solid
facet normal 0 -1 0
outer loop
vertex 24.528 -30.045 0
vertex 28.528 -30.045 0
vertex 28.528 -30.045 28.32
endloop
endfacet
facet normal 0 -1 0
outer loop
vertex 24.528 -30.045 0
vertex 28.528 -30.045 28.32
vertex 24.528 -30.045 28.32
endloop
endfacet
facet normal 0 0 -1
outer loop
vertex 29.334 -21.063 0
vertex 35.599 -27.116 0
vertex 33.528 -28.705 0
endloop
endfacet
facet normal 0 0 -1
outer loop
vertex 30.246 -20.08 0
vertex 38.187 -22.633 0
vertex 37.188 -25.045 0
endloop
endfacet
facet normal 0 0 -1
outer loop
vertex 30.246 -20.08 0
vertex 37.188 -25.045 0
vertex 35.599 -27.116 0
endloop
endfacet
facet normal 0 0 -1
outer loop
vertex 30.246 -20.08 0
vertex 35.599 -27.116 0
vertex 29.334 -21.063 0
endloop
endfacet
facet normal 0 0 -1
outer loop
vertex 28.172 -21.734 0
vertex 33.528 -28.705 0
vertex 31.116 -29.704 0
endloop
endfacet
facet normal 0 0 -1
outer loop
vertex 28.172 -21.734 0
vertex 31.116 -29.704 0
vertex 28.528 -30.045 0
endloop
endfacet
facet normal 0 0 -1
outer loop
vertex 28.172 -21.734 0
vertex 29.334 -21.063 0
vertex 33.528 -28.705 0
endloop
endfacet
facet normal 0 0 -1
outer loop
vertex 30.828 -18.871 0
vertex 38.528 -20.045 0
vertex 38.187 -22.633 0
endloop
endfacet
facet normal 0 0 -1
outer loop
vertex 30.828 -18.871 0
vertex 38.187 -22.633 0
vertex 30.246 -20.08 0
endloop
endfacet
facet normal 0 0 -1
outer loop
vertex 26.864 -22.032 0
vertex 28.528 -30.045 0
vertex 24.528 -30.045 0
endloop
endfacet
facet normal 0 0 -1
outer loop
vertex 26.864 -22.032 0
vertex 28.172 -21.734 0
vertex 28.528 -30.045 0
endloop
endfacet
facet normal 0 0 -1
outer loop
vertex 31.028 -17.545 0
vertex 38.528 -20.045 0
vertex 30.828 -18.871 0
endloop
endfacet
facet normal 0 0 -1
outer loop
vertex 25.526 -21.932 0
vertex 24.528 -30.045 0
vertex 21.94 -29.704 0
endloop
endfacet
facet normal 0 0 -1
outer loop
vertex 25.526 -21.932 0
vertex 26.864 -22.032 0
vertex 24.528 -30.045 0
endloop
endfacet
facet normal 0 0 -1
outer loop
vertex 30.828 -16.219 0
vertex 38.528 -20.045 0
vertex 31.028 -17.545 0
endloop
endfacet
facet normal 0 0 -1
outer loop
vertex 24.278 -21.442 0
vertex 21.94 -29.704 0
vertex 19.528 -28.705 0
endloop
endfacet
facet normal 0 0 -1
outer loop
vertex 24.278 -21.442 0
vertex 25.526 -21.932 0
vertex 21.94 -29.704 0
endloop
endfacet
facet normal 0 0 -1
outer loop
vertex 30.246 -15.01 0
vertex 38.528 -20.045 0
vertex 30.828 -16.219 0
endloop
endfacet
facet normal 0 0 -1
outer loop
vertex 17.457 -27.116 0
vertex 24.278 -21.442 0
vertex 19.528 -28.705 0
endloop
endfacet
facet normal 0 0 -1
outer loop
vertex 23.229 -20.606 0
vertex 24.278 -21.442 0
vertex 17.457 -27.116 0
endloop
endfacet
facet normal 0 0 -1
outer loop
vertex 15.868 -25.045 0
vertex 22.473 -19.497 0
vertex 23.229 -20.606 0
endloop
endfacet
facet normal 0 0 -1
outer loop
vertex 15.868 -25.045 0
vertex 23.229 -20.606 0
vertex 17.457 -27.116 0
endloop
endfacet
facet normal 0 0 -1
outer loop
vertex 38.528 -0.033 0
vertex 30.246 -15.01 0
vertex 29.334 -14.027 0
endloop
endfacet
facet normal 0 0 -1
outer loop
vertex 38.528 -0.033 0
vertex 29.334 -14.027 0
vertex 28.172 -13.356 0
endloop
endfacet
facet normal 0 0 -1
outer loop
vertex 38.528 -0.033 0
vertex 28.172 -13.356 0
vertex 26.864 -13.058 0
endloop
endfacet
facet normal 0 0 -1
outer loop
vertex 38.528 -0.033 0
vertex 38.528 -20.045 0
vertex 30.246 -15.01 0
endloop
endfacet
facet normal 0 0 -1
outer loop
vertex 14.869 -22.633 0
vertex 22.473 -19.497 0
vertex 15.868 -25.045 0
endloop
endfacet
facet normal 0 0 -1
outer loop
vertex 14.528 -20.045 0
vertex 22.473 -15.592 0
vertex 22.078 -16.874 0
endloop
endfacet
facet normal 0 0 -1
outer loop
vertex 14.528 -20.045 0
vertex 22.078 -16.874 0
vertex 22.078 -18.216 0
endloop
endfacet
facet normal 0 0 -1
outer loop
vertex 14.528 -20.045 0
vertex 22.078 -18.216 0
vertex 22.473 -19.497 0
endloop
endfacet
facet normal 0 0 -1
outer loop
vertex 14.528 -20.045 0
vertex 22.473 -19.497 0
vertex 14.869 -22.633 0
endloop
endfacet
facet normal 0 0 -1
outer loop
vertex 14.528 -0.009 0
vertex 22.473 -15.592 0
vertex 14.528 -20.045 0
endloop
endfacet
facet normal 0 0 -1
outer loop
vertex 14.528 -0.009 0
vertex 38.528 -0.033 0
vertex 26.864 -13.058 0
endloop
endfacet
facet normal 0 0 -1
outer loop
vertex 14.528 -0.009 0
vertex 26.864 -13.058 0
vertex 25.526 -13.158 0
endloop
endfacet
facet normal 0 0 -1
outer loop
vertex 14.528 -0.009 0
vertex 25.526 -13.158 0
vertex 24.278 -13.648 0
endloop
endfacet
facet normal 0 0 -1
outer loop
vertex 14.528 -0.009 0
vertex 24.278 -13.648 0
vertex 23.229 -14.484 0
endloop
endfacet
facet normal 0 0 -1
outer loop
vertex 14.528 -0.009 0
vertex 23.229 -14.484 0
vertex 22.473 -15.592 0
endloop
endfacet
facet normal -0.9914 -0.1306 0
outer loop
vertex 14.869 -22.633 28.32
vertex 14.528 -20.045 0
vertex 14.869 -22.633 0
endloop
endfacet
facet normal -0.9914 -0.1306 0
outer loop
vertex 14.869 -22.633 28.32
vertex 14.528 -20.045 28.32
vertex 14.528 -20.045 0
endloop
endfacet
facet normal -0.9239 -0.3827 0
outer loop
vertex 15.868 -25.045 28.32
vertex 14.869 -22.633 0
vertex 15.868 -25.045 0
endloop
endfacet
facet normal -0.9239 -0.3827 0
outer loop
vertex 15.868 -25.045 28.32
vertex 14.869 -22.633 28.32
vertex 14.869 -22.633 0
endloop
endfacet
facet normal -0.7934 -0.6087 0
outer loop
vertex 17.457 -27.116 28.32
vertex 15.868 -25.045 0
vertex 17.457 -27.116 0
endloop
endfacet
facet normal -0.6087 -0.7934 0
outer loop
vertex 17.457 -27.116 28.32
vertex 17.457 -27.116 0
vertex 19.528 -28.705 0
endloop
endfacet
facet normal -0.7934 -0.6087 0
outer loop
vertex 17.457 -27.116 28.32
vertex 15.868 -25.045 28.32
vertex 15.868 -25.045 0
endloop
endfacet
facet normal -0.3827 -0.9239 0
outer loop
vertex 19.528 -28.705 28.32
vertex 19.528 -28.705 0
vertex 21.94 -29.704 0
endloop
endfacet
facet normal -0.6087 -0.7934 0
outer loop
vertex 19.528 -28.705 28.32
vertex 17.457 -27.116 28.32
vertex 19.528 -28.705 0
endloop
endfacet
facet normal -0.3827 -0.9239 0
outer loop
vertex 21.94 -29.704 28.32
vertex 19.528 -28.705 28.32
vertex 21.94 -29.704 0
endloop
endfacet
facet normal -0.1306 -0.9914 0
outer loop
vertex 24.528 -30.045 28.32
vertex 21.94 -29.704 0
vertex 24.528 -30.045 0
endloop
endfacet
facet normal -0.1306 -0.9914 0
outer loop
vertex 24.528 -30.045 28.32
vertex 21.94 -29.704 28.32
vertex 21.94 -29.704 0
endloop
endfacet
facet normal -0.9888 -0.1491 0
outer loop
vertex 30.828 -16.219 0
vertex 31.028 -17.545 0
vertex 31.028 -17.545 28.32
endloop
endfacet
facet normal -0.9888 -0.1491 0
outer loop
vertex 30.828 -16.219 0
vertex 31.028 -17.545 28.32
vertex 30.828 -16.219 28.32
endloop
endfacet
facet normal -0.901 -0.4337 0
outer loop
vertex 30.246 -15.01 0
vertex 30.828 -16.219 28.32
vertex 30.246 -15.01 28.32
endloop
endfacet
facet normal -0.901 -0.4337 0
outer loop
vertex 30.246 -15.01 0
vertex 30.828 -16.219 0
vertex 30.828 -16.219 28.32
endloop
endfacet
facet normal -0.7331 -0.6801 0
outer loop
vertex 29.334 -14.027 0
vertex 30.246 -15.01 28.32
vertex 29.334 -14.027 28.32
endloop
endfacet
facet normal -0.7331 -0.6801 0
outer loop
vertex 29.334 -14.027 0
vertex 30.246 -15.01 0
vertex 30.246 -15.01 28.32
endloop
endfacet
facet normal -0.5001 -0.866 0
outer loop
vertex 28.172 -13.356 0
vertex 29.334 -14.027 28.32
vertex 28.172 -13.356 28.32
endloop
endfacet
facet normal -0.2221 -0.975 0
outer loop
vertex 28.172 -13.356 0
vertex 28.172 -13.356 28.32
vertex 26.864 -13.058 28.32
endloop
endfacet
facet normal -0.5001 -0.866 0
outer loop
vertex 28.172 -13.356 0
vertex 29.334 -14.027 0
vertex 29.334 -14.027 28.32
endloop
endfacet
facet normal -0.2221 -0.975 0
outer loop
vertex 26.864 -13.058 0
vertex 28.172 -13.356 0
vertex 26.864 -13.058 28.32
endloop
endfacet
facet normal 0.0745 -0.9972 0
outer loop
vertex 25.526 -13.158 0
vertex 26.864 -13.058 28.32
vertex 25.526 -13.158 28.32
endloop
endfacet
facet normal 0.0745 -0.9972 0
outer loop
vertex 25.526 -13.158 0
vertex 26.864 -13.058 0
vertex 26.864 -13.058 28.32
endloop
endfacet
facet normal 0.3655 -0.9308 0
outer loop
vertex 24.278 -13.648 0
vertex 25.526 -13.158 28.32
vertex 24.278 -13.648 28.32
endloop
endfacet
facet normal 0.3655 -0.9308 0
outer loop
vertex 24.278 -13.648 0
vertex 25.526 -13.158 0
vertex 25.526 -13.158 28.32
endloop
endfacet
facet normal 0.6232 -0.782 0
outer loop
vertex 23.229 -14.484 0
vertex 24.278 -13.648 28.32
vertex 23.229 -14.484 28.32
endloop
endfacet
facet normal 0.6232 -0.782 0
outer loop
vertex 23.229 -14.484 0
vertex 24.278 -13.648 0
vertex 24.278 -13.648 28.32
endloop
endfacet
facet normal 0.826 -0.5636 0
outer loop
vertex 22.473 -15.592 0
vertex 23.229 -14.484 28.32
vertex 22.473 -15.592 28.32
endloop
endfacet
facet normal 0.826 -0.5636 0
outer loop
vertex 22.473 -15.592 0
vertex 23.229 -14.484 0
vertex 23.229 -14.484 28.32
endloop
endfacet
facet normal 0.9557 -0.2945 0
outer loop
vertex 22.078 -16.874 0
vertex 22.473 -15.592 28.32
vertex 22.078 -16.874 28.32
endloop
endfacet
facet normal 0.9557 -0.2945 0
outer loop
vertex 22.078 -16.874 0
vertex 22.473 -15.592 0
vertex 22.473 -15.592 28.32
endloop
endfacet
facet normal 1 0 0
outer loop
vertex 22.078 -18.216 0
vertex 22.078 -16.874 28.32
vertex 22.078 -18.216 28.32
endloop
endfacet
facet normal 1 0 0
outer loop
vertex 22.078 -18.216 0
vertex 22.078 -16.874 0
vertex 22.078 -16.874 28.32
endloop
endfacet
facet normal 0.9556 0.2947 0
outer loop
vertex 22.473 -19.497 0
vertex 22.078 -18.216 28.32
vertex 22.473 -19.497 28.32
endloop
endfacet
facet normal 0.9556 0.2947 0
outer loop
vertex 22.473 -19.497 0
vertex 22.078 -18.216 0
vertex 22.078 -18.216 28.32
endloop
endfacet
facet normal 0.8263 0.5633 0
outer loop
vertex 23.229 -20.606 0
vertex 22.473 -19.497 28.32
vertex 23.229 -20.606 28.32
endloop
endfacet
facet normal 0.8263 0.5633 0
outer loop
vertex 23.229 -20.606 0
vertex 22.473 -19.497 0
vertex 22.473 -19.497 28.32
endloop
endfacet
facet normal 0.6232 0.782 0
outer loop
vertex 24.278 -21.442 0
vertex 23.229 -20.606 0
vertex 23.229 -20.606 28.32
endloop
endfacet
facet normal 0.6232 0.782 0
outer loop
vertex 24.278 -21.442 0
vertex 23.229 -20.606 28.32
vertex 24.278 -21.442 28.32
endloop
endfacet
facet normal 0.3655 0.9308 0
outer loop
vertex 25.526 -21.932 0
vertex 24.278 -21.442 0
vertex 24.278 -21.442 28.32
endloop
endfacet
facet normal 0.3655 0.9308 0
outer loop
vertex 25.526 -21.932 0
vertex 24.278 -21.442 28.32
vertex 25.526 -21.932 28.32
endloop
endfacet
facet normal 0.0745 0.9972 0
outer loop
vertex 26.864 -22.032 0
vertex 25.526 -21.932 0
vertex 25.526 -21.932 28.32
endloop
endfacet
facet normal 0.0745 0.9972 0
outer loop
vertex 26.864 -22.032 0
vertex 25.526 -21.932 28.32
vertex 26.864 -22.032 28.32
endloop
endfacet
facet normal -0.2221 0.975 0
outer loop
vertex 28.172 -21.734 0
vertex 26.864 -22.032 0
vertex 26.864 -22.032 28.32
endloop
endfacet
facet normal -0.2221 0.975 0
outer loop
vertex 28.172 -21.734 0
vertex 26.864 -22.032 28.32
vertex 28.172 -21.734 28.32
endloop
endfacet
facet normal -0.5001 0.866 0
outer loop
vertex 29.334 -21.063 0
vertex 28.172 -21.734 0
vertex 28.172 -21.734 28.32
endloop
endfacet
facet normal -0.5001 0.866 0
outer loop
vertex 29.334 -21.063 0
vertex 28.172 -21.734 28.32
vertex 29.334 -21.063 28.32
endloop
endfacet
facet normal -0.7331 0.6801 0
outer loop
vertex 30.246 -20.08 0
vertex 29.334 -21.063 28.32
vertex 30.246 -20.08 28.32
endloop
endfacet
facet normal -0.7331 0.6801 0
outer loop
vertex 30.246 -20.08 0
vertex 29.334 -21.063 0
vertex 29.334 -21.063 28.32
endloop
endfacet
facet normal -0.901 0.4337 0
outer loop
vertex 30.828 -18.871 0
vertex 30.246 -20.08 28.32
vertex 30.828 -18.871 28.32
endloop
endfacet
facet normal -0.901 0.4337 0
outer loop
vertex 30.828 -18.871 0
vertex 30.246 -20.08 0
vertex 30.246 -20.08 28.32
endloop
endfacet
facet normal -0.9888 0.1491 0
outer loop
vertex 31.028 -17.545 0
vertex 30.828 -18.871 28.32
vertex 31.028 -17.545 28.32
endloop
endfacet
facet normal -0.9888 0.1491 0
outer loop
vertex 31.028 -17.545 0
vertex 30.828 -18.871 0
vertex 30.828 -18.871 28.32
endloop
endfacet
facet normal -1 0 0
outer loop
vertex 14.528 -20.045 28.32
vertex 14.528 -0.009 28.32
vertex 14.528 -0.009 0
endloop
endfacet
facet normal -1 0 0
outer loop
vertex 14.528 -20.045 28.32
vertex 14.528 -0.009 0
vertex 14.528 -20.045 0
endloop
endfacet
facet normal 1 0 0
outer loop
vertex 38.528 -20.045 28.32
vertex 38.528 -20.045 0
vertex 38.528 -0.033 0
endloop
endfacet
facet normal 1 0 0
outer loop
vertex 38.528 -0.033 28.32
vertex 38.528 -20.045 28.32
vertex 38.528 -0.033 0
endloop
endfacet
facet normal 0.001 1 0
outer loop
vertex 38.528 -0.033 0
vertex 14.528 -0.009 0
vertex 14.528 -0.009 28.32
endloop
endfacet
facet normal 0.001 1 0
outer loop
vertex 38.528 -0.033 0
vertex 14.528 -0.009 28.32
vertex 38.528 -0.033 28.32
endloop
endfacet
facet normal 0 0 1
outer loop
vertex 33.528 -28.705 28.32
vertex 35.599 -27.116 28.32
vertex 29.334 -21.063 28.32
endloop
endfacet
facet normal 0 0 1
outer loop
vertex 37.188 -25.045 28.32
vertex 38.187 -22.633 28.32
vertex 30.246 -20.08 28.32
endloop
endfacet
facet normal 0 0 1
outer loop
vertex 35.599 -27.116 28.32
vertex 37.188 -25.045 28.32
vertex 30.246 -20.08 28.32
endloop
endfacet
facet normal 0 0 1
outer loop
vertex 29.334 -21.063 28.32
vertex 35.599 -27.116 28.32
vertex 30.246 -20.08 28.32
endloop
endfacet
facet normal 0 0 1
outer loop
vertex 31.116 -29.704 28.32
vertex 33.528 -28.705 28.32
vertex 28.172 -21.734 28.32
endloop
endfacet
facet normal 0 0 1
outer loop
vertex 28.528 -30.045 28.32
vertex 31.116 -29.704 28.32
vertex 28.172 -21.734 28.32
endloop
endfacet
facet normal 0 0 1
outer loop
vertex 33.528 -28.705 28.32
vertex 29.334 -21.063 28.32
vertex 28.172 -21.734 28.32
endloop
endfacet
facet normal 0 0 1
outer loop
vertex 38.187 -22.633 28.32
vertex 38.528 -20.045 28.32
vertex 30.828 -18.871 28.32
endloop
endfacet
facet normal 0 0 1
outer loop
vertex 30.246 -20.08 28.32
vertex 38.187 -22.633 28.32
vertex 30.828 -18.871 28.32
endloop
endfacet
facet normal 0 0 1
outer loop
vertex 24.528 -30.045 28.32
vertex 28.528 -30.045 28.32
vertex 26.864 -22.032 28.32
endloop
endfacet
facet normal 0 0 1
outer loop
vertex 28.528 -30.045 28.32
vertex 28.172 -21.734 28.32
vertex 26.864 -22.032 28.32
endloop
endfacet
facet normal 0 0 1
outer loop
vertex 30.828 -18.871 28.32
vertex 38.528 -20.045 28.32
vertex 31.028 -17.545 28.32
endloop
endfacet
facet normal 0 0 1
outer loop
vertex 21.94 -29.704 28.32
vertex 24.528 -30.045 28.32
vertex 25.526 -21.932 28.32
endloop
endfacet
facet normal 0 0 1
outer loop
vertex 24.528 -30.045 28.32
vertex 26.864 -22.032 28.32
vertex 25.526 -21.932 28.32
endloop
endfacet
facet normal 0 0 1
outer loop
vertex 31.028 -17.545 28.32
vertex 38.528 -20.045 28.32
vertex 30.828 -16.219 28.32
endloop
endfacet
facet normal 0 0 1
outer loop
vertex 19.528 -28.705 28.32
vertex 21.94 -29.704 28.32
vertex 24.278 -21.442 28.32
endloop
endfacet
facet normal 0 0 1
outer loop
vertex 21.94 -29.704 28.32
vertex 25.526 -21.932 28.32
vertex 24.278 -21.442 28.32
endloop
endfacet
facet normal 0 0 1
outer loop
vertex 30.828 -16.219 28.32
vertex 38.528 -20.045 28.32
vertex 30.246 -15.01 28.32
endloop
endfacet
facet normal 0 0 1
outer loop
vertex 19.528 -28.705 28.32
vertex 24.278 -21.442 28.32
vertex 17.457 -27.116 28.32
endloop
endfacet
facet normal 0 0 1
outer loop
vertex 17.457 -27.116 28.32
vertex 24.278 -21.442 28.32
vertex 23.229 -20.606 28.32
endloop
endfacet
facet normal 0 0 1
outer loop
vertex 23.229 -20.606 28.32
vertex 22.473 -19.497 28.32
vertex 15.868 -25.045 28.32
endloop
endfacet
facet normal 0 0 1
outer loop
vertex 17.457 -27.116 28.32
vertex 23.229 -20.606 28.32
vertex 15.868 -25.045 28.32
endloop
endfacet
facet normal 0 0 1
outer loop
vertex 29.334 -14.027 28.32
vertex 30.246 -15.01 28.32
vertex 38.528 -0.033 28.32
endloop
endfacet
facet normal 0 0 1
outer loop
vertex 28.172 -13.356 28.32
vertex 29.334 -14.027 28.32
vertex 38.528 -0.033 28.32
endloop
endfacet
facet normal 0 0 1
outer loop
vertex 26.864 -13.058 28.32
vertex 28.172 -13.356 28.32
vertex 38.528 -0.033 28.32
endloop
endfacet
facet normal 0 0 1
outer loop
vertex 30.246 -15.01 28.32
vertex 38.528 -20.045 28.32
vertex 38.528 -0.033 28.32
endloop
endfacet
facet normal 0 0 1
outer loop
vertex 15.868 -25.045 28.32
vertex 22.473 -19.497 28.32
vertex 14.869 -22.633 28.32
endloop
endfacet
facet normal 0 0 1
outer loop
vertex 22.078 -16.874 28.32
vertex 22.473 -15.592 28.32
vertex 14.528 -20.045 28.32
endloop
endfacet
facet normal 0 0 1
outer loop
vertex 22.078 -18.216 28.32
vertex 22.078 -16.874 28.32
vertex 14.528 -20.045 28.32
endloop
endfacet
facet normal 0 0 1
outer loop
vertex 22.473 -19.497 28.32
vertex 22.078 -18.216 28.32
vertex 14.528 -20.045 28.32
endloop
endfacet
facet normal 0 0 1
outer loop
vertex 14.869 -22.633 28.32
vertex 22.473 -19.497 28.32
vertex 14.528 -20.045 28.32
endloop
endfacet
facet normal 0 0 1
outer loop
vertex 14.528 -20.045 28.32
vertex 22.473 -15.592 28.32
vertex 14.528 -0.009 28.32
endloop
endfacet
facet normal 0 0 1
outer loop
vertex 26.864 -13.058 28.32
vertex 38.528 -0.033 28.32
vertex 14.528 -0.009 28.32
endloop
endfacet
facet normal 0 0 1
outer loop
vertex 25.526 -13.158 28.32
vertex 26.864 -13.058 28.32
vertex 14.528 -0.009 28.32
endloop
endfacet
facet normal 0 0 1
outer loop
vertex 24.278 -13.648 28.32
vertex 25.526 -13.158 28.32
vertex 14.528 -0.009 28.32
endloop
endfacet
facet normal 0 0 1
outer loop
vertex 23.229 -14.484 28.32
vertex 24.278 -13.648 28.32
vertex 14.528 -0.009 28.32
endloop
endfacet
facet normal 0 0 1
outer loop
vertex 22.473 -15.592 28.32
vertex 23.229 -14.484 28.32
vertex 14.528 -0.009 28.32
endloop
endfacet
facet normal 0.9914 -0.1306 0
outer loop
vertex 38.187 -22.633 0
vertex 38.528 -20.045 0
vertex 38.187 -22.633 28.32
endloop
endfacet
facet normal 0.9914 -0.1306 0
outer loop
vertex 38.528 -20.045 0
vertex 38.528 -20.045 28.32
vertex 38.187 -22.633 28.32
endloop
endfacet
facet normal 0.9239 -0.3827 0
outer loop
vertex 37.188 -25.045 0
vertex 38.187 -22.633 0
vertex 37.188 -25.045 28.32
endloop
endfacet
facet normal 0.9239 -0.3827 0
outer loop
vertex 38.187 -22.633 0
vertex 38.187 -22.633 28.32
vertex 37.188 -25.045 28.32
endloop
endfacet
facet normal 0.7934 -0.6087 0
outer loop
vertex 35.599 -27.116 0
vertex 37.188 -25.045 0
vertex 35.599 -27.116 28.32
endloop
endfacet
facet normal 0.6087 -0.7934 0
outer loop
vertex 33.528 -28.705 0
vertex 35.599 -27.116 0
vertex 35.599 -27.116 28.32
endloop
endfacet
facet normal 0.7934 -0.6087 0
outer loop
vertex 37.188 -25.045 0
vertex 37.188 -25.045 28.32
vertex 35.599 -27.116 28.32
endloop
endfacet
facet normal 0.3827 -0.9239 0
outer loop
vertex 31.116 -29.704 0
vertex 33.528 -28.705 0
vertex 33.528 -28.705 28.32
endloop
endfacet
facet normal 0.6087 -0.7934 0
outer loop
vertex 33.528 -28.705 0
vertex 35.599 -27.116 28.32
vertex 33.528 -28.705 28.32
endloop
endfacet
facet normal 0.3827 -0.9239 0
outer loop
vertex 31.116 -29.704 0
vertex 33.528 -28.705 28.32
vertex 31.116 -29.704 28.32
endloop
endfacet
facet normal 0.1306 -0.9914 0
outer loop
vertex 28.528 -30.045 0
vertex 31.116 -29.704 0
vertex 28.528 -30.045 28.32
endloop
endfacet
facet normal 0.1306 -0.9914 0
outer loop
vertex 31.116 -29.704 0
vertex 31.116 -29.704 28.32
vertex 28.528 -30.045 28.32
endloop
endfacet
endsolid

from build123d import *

# Parameters (mm, degrees)
CROQUIS1_R              = 4.5
SALIENTE_EXTRUIR1_DEPTH = 28.32
REDONDEO1_R             = 10


with BuildPart() as part:
    # Croquis1 → Saliente-Extruir1 (new body)
    with BuildSketch(Plane.XY):
        Polygon((14.527798388, -0.008569378), (38.527798388, -0.032811814), (38.527798388, -5.044933007), (38.527798388, -30.044933007), (14.527798388, -30.044933007), (14.527798388, -5.044933007), align=None)
        with Locations((26.527798388, -17.544933007)):
            Circle(CROQUIS1_R, mode=Mode.SUBTRACT)
    extrude(amount=SALIENTE_EXTRUIR1_DEPTH)

    # Redondeo1
    redondeo1_edges = [part.edges().sort_by_distance(p)[0] for p in [
        (14.527798388, -30.044933007, 14.16),
        (38.527798388, -30.044933007, 14.16),
    ]]
    fillet(redondeo1_edges, radius=REDONDEO1_R)


solid = part.part
